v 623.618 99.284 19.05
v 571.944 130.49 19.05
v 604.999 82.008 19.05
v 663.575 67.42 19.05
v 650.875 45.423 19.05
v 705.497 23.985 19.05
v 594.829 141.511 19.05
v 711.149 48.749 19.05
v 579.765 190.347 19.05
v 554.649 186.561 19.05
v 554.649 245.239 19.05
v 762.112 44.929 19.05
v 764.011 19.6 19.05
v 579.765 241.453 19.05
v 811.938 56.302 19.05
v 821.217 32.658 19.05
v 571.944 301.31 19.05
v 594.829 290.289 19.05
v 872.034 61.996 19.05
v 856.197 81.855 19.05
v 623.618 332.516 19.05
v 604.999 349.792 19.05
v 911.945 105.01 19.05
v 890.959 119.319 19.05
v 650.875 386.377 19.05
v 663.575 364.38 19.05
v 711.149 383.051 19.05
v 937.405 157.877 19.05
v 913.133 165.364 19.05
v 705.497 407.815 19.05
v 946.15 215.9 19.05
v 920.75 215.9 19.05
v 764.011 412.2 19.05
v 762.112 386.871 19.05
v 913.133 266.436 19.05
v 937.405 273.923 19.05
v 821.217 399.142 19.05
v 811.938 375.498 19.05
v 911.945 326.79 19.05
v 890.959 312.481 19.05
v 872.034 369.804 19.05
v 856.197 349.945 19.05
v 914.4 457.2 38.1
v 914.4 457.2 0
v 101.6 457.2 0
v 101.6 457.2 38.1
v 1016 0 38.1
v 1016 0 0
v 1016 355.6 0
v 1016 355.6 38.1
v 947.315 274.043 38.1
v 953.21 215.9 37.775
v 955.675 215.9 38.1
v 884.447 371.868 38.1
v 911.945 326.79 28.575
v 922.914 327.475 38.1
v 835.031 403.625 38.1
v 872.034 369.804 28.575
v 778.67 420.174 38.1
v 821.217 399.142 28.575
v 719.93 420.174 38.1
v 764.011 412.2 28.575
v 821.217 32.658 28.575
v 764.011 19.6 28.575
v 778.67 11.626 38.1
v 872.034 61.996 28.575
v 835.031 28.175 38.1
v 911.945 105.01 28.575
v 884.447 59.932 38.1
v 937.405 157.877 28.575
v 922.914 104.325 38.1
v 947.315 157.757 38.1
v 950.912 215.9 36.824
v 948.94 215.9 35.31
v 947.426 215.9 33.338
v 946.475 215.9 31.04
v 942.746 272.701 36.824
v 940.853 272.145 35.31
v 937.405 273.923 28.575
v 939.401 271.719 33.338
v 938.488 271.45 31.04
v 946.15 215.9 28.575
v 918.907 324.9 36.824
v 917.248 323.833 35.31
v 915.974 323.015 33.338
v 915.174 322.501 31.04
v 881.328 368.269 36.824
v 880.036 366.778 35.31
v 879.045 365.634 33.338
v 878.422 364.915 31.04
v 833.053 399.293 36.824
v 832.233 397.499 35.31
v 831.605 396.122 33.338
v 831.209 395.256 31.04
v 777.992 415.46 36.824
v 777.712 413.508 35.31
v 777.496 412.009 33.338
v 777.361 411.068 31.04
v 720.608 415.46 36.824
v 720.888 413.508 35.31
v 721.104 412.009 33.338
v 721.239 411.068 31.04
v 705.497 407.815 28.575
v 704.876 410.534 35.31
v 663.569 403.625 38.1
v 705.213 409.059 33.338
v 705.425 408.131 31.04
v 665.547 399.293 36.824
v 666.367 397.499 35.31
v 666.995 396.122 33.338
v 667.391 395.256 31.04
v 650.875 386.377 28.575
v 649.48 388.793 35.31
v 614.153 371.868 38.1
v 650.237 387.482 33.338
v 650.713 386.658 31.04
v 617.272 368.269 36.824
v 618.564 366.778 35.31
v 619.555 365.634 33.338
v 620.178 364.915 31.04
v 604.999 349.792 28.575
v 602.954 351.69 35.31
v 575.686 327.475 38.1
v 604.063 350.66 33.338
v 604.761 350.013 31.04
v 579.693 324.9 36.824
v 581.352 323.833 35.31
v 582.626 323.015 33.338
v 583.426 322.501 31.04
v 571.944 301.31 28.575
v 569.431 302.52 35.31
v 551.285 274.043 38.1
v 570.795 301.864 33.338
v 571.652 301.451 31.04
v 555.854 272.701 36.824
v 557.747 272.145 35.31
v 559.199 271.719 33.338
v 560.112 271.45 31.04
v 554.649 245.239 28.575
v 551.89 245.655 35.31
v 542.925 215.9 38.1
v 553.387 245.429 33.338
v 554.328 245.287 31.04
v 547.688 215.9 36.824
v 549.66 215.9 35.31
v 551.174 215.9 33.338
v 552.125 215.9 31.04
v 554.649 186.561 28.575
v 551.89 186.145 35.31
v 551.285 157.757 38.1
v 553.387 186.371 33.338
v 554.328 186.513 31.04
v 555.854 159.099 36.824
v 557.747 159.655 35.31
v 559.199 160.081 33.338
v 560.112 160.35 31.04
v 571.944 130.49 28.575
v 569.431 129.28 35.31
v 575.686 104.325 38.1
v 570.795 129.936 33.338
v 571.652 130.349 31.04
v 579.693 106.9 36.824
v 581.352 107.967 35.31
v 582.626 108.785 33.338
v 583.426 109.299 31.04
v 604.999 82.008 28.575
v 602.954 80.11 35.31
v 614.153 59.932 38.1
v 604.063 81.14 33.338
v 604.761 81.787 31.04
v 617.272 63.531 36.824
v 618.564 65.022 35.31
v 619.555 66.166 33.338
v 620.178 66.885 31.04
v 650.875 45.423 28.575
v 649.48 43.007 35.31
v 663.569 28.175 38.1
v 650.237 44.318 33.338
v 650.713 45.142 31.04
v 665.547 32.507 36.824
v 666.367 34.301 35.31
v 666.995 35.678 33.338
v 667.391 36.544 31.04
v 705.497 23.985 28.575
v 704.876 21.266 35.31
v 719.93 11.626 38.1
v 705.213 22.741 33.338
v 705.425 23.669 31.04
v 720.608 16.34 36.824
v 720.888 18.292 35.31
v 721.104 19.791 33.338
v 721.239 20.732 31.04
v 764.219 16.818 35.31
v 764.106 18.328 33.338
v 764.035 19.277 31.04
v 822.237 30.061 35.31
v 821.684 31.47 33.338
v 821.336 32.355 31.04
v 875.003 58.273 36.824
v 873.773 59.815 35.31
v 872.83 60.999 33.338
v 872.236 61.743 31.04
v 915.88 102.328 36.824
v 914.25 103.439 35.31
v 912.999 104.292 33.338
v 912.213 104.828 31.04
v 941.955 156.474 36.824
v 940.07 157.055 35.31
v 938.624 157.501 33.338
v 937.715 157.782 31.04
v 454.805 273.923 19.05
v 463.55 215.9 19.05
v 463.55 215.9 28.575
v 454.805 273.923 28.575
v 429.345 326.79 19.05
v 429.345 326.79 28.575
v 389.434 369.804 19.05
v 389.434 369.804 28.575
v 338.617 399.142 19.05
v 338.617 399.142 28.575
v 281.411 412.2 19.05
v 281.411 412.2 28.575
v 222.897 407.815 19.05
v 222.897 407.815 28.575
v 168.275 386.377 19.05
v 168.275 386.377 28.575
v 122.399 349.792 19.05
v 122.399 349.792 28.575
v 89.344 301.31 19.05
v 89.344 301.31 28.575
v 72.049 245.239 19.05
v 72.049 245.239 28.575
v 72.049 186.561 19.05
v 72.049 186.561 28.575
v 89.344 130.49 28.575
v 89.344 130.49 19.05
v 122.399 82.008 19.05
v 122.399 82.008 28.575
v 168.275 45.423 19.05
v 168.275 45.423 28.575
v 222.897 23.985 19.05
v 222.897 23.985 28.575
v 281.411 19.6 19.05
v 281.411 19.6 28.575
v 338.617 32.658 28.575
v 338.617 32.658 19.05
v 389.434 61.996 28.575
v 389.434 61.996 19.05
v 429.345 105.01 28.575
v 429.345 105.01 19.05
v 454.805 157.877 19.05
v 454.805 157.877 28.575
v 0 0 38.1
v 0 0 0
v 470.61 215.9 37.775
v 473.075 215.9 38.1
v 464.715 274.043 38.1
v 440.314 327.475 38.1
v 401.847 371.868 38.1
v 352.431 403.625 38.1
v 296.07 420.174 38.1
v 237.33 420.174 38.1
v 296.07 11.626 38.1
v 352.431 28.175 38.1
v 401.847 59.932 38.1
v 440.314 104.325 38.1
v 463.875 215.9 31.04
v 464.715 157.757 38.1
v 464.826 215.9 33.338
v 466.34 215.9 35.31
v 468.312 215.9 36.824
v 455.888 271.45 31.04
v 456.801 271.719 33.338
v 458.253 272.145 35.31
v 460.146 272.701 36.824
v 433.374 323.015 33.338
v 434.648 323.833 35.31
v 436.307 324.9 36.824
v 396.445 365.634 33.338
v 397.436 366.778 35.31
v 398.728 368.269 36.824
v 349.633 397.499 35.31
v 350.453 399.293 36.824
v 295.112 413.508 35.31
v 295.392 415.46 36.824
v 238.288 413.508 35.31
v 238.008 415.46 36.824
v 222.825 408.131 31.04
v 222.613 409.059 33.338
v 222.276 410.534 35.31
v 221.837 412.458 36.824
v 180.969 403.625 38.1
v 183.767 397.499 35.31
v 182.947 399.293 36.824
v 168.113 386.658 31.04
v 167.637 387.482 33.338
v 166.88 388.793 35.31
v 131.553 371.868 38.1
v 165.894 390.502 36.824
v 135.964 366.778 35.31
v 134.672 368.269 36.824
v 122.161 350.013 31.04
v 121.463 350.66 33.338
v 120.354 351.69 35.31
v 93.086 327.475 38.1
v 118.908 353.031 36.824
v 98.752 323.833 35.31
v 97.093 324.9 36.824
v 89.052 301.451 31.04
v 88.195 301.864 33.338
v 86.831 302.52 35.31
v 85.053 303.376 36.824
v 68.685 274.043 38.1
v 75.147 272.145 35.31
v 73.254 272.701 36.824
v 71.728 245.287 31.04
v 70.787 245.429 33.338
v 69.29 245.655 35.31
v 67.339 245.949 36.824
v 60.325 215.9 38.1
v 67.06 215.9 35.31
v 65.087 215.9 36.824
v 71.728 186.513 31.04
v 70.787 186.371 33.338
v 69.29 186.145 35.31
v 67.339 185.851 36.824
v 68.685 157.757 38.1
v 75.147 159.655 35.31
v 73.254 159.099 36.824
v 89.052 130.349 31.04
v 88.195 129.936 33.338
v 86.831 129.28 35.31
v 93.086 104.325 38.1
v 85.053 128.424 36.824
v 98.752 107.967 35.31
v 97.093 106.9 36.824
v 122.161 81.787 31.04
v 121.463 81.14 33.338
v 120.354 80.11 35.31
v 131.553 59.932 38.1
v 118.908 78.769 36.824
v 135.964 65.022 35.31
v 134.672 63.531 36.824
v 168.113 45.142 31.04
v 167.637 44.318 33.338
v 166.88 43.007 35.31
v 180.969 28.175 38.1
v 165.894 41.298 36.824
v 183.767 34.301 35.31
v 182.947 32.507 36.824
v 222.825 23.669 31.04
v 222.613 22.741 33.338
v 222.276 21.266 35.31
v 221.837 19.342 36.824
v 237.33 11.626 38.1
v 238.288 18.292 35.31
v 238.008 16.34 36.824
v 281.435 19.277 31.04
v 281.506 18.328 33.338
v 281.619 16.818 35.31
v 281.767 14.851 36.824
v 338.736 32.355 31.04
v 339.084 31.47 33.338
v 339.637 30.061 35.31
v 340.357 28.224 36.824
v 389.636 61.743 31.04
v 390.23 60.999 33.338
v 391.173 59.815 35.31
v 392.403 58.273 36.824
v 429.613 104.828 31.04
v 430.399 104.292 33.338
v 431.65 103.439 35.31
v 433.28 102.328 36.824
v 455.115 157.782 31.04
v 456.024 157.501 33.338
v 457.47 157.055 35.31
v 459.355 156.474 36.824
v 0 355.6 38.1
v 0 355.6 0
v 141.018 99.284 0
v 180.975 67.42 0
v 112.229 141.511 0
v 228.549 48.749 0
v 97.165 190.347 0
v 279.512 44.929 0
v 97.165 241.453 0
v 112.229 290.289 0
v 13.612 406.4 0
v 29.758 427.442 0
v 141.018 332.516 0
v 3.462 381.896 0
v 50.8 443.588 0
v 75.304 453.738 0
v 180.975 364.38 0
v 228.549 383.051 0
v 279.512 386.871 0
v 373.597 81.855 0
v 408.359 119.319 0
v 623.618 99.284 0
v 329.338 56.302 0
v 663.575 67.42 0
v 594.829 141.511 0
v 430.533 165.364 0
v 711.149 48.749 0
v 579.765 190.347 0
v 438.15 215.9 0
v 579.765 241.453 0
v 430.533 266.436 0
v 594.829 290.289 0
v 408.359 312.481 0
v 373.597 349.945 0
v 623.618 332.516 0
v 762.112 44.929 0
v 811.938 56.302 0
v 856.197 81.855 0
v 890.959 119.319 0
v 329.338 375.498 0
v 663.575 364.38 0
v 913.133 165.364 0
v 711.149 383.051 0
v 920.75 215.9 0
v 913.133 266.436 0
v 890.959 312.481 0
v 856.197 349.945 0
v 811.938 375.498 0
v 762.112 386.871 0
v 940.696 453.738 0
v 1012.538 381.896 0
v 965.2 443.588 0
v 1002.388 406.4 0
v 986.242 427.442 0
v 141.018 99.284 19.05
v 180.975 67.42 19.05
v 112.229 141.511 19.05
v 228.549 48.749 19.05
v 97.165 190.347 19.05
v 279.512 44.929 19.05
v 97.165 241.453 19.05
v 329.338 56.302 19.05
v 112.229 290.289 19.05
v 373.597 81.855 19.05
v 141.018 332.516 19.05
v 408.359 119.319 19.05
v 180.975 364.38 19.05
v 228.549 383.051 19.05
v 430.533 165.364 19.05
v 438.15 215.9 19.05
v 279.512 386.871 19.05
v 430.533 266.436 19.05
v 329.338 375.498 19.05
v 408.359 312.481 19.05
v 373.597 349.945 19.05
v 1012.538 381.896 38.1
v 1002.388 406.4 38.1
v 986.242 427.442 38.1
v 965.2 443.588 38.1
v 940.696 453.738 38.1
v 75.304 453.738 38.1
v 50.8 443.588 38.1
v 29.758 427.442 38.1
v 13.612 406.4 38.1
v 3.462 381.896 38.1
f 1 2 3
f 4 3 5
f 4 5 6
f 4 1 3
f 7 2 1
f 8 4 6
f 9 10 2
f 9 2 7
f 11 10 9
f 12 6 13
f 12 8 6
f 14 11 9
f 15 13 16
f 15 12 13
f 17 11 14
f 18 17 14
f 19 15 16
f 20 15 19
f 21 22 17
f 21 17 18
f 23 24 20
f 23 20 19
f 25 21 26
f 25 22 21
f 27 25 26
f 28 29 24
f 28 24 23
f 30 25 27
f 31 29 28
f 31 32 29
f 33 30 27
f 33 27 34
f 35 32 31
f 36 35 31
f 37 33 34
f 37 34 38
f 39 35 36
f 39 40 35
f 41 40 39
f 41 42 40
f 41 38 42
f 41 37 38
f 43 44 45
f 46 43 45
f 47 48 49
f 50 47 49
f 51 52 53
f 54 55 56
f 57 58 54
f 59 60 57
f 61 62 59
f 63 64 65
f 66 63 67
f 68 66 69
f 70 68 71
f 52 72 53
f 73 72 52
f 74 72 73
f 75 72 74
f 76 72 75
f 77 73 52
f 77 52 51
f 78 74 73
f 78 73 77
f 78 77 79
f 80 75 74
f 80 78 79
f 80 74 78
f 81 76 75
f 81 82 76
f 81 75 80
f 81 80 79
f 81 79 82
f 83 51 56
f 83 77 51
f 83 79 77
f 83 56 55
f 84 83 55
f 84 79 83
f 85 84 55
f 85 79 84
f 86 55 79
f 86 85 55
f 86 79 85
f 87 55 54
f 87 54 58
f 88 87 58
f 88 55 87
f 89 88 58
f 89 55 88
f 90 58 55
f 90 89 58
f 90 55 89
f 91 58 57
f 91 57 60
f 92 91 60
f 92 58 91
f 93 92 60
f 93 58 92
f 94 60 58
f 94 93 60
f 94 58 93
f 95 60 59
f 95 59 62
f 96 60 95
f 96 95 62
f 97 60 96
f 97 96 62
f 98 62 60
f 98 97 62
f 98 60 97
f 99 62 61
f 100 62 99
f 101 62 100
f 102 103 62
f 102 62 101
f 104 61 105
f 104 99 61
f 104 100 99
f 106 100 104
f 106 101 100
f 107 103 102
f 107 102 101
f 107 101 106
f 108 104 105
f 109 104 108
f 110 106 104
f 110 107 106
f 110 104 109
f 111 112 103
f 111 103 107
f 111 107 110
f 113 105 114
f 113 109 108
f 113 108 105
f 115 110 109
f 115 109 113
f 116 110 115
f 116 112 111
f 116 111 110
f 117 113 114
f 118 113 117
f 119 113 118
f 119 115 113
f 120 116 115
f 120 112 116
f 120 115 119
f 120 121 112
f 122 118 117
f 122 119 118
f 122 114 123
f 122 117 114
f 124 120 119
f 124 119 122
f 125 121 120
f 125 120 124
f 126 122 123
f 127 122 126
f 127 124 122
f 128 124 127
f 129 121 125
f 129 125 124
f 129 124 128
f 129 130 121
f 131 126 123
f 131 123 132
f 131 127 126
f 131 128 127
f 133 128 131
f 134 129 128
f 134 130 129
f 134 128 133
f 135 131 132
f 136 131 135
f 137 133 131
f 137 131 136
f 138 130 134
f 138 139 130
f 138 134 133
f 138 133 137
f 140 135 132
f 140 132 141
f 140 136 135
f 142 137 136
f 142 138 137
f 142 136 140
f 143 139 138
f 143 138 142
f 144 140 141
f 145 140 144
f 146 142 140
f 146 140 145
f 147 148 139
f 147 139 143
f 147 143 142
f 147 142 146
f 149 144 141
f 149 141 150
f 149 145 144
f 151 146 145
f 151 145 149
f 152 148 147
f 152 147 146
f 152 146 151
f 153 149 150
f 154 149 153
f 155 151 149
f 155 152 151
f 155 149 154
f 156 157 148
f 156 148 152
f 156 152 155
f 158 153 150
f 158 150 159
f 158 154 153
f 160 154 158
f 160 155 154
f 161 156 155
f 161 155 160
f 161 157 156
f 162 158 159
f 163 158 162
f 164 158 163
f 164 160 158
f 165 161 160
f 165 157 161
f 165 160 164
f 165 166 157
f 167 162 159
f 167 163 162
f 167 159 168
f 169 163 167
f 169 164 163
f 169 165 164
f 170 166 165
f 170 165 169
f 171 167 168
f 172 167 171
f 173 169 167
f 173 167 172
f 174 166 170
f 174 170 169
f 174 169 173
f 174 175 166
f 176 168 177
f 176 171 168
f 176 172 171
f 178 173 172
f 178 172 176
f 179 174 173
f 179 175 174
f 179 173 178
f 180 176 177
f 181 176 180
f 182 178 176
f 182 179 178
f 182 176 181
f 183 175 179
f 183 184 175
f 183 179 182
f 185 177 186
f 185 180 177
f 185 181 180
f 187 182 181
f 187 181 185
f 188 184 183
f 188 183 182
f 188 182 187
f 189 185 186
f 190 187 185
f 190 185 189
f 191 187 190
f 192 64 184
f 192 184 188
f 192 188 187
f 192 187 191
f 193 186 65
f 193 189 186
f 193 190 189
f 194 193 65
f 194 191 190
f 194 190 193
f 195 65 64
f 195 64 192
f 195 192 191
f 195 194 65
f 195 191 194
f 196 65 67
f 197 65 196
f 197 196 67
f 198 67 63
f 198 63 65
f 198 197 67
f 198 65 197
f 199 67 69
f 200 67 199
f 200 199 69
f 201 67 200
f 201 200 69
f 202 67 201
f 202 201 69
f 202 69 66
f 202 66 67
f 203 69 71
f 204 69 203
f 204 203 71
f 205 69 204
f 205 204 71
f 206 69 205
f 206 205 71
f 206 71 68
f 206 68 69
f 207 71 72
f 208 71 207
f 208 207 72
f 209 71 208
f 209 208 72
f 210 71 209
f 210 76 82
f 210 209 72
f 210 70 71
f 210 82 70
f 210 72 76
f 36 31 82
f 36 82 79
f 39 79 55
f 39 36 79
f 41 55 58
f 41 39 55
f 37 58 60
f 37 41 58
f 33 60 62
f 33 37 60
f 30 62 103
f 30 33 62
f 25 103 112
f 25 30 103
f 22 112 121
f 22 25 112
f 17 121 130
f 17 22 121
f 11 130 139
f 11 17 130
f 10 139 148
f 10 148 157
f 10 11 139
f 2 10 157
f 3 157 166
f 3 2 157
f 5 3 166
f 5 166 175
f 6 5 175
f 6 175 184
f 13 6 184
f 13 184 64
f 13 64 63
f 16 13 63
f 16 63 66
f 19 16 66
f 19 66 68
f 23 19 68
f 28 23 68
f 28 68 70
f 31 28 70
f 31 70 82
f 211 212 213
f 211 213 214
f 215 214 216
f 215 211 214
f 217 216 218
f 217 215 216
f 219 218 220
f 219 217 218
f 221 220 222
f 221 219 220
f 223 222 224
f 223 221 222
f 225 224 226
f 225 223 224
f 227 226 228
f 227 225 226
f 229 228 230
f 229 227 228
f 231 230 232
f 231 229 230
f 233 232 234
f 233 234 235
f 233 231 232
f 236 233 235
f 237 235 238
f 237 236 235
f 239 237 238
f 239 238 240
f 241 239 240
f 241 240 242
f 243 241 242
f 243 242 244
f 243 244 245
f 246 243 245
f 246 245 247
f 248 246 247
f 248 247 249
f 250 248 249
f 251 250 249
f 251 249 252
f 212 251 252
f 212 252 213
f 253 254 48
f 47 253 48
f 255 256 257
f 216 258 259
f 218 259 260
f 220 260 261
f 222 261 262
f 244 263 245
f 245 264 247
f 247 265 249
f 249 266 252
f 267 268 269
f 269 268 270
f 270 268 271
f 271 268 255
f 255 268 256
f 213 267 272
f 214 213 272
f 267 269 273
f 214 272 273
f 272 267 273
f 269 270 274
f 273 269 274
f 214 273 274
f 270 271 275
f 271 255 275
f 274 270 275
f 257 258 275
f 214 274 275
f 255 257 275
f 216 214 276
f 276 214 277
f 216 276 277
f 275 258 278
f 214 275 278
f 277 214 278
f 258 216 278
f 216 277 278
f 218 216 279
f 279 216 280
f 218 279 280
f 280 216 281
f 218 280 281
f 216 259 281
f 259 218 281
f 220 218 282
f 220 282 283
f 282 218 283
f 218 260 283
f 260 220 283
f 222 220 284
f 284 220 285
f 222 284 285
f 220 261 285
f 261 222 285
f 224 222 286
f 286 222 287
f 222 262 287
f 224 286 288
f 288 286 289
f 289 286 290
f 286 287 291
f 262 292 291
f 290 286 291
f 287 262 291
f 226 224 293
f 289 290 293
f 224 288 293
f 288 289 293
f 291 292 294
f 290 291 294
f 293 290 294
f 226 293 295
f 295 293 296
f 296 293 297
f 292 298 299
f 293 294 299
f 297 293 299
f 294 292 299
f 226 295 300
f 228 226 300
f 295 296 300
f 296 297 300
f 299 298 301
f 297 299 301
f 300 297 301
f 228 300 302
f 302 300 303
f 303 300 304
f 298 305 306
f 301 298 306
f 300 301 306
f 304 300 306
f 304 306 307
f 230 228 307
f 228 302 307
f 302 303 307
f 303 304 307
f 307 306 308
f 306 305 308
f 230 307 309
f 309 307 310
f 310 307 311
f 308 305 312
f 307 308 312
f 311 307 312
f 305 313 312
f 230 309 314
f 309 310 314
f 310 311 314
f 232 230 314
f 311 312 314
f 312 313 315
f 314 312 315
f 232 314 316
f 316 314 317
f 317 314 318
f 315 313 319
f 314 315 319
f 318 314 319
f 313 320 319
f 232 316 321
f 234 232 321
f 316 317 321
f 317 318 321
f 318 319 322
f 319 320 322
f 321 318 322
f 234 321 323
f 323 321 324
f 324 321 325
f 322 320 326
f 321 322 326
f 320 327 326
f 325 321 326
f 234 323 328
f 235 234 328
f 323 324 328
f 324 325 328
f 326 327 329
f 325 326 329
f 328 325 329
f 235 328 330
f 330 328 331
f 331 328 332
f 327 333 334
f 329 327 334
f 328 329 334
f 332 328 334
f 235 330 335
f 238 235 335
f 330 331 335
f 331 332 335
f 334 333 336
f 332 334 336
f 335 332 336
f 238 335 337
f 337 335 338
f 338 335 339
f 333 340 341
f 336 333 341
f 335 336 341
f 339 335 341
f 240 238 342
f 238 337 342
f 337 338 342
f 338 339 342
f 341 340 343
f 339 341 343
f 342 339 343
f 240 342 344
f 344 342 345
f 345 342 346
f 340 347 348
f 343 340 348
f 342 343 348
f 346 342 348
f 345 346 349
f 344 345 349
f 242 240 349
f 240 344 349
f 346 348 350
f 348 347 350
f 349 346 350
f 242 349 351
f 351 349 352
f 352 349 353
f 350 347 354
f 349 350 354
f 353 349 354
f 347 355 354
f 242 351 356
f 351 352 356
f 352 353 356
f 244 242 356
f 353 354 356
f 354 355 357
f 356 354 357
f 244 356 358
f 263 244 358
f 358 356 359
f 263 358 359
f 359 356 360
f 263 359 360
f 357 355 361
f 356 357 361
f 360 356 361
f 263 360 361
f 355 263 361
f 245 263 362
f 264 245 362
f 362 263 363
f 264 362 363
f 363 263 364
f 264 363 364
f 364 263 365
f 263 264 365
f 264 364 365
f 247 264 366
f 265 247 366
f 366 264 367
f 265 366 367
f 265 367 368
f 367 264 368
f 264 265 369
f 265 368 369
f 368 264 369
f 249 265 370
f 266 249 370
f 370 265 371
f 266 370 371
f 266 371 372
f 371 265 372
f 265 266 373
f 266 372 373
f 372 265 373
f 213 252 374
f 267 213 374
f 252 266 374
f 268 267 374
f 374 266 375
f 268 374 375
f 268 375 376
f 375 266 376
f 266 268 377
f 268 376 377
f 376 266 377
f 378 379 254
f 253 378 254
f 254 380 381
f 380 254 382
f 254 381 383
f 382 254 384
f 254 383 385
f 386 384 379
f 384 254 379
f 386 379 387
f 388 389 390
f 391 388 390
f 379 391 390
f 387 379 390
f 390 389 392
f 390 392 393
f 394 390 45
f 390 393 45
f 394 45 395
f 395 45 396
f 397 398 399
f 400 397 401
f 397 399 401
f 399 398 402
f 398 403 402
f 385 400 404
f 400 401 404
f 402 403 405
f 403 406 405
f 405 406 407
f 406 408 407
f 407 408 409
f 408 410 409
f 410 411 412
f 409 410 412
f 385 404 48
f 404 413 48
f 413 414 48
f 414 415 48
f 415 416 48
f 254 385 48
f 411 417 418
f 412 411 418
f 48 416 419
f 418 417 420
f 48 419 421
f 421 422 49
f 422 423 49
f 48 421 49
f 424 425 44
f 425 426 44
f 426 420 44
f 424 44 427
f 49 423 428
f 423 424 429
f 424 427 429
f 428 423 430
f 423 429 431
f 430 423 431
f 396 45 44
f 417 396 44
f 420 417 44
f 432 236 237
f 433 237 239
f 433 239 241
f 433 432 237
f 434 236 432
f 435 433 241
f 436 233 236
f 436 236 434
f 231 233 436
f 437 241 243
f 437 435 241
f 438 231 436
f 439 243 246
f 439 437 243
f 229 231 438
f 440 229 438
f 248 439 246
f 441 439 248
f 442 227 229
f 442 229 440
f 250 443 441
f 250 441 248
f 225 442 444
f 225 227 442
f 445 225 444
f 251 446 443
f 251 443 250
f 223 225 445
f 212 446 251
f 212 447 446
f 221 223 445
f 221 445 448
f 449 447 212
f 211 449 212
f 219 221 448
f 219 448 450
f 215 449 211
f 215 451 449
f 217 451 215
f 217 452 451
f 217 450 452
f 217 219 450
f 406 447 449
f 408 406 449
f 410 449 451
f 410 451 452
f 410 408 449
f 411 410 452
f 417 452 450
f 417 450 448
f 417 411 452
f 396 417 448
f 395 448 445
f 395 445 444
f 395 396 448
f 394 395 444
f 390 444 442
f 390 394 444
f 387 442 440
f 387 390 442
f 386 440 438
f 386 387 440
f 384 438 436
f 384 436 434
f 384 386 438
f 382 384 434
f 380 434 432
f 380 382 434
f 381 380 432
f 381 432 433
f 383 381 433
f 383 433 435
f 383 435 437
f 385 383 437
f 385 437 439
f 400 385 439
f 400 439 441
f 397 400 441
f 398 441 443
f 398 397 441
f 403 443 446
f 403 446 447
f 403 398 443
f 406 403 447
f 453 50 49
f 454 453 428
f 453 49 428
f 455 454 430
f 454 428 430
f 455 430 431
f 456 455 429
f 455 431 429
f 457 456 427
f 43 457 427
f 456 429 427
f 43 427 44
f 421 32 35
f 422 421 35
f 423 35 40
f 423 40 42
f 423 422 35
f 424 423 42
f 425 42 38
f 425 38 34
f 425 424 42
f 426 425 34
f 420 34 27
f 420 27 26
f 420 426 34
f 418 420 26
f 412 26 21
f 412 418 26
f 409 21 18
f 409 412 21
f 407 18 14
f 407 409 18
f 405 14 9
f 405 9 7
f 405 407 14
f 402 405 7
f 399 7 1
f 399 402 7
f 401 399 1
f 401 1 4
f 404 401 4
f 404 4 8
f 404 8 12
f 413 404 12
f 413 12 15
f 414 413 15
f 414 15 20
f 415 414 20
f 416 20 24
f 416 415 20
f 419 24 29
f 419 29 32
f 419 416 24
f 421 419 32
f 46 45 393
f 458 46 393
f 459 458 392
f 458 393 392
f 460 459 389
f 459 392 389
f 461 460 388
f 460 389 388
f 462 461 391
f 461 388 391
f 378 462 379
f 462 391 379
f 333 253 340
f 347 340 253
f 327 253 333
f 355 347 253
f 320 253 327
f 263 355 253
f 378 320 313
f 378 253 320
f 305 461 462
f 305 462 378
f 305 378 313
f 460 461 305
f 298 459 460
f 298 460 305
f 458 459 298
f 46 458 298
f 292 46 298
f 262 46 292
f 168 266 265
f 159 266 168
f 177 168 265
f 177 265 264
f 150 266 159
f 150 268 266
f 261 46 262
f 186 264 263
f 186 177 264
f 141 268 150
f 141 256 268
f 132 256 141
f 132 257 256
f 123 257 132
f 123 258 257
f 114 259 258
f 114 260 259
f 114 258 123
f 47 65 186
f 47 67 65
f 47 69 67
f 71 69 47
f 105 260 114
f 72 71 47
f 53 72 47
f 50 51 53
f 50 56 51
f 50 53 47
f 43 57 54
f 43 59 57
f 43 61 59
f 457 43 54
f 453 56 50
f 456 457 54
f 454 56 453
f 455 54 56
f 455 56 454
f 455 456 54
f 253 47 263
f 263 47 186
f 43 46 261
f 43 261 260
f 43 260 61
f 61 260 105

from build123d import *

# Parameters (mm, degrees)
F0_R     = 196.85
F1_DEPTH = 38.1
F0_R_2   = 171.45
F2_DEPTH = 19.05
F3_R     = 9.525


with BuildPart() as f1:
    # F0 (on Top) → F1 (new body)
    with BuildSketch(Plane.XY):
        with BuildLine():
            Line((0, 355.6), (0, 0))
            Line((0, 0), (1016, 0))
            Line((1016, 0), (1016, 355.6))
            ThreePointArc((1016, 355.6), (986.242049, 427.442049), (914.4, 457.2))
            Line((914.4, 457.2), (101.6, 457.2))
            ThreePointArc((101.6, 457.2), (29.757951, 427.442049), (0, 355.6))
        make_face()
        with Locations((266.7, 215.9)):
            Circle(F0_R, mode=Mode.SUBTRACT)
        with Locations((749.3, 215.9)):
            Circle(F0_R, mode=Mode.SUBTRACT)
    extrude(amount=F1_DEPTH)

    # F0 (on Top) → F2 (join)
    with BuildSketch(Plane.XY):
        with Locations((266.7, 215.9)):
            Circle(F0_R)
        with Locations((266.7, 215.9)):
            Circle(F0_R_2, mode=Mode.SUBTRACT)
        with Locations((749.3, 215.9)):
            Circle(F0_R)
        with Locations((749.3, 215.9)):
            Circle(F0_R_2, mode=Mode.SUBTRACT)
    extrude(amount=F2_DEPTH)

    # F3
    f3_edges = [f1.edges().sort_by_distance(p)[0] for p in [
        (69.85, 215.9, 38.1),
        (552.45, 215.9, 38.1),
    ]]
    fillet(f3_edges, radius=F3_R)


solid = f1.part
